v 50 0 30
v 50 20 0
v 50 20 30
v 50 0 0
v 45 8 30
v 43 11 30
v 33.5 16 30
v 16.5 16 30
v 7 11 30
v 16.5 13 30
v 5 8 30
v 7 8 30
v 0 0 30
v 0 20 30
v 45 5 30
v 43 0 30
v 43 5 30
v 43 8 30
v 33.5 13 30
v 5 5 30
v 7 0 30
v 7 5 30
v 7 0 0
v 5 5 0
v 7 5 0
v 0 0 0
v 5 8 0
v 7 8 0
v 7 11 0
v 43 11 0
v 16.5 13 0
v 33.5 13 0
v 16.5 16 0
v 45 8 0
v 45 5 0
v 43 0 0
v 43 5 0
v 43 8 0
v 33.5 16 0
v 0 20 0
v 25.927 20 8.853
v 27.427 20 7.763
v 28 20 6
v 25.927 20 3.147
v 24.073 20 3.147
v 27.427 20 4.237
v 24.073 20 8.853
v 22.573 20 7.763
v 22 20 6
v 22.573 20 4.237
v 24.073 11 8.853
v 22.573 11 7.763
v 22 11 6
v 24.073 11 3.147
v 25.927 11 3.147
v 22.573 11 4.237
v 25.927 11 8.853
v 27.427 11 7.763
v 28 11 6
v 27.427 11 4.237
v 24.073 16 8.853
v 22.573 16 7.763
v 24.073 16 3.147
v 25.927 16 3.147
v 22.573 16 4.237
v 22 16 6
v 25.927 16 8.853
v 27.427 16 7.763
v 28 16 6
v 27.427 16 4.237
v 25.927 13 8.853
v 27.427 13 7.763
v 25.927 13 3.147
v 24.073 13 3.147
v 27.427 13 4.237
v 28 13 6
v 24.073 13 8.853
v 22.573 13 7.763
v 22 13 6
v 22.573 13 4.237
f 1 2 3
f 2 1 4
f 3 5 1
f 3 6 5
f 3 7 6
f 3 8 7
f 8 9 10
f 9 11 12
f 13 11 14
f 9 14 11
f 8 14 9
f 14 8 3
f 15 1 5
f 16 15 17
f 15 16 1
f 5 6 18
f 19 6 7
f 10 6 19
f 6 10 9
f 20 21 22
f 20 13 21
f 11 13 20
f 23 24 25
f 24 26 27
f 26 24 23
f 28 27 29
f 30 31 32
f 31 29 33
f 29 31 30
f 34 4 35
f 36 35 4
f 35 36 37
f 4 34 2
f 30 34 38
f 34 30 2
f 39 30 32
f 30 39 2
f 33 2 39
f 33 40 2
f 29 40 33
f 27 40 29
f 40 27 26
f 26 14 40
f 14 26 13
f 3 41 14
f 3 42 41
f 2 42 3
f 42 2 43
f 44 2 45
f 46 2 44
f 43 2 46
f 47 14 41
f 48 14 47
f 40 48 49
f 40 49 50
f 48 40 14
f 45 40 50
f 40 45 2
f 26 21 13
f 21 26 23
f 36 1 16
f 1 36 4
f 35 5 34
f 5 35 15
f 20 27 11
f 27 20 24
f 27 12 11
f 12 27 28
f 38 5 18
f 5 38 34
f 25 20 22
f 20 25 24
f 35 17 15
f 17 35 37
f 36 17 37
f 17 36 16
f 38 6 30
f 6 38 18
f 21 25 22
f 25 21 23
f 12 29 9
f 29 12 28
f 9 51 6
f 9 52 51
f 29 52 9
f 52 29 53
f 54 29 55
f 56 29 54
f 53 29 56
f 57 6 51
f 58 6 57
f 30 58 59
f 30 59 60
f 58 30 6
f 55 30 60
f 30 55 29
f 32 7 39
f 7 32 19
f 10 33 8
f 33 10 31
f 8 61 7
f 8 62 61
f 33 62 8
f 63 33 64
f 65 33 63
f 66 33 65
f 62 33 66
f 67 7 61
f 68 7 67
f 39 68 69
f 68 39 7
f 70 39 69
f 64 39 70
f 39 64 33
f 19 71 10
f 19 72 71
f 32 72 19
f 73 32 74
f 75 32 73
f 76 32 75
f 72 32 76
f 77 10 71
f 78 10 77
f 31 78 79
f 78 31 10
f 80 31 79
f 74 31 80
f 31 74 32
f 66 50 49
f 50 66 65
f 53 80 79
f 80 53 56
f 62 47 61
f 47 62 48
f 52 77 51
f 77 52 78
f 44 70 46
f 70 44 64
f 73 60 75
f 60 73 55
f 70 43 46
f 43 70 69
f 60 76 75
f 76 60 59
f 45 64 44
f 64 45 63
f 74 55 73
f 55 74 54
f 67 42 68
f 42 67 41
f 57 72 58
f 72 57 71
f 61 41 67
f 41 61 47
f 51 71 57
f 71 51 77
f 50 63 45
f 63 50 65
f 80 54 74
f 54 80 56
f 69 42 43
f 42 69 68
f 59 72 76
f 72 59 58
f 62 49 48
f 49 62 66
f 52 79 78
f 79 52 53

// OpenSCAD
difference() {
    cube([50, 20, 30], center=false);
    translate([5, 5, -10]) cube([40, 3, 70], center=false);
    translate([7, -1, -10]) cube([36, 12, 70], center=false);
    translate([25-17/2, 13, -10]) cube([17, 3, 70], center=false);
    translate([25, 1, 6]) rotate([-90, 0, 0]) cylinder(20, 3, 3);
}
